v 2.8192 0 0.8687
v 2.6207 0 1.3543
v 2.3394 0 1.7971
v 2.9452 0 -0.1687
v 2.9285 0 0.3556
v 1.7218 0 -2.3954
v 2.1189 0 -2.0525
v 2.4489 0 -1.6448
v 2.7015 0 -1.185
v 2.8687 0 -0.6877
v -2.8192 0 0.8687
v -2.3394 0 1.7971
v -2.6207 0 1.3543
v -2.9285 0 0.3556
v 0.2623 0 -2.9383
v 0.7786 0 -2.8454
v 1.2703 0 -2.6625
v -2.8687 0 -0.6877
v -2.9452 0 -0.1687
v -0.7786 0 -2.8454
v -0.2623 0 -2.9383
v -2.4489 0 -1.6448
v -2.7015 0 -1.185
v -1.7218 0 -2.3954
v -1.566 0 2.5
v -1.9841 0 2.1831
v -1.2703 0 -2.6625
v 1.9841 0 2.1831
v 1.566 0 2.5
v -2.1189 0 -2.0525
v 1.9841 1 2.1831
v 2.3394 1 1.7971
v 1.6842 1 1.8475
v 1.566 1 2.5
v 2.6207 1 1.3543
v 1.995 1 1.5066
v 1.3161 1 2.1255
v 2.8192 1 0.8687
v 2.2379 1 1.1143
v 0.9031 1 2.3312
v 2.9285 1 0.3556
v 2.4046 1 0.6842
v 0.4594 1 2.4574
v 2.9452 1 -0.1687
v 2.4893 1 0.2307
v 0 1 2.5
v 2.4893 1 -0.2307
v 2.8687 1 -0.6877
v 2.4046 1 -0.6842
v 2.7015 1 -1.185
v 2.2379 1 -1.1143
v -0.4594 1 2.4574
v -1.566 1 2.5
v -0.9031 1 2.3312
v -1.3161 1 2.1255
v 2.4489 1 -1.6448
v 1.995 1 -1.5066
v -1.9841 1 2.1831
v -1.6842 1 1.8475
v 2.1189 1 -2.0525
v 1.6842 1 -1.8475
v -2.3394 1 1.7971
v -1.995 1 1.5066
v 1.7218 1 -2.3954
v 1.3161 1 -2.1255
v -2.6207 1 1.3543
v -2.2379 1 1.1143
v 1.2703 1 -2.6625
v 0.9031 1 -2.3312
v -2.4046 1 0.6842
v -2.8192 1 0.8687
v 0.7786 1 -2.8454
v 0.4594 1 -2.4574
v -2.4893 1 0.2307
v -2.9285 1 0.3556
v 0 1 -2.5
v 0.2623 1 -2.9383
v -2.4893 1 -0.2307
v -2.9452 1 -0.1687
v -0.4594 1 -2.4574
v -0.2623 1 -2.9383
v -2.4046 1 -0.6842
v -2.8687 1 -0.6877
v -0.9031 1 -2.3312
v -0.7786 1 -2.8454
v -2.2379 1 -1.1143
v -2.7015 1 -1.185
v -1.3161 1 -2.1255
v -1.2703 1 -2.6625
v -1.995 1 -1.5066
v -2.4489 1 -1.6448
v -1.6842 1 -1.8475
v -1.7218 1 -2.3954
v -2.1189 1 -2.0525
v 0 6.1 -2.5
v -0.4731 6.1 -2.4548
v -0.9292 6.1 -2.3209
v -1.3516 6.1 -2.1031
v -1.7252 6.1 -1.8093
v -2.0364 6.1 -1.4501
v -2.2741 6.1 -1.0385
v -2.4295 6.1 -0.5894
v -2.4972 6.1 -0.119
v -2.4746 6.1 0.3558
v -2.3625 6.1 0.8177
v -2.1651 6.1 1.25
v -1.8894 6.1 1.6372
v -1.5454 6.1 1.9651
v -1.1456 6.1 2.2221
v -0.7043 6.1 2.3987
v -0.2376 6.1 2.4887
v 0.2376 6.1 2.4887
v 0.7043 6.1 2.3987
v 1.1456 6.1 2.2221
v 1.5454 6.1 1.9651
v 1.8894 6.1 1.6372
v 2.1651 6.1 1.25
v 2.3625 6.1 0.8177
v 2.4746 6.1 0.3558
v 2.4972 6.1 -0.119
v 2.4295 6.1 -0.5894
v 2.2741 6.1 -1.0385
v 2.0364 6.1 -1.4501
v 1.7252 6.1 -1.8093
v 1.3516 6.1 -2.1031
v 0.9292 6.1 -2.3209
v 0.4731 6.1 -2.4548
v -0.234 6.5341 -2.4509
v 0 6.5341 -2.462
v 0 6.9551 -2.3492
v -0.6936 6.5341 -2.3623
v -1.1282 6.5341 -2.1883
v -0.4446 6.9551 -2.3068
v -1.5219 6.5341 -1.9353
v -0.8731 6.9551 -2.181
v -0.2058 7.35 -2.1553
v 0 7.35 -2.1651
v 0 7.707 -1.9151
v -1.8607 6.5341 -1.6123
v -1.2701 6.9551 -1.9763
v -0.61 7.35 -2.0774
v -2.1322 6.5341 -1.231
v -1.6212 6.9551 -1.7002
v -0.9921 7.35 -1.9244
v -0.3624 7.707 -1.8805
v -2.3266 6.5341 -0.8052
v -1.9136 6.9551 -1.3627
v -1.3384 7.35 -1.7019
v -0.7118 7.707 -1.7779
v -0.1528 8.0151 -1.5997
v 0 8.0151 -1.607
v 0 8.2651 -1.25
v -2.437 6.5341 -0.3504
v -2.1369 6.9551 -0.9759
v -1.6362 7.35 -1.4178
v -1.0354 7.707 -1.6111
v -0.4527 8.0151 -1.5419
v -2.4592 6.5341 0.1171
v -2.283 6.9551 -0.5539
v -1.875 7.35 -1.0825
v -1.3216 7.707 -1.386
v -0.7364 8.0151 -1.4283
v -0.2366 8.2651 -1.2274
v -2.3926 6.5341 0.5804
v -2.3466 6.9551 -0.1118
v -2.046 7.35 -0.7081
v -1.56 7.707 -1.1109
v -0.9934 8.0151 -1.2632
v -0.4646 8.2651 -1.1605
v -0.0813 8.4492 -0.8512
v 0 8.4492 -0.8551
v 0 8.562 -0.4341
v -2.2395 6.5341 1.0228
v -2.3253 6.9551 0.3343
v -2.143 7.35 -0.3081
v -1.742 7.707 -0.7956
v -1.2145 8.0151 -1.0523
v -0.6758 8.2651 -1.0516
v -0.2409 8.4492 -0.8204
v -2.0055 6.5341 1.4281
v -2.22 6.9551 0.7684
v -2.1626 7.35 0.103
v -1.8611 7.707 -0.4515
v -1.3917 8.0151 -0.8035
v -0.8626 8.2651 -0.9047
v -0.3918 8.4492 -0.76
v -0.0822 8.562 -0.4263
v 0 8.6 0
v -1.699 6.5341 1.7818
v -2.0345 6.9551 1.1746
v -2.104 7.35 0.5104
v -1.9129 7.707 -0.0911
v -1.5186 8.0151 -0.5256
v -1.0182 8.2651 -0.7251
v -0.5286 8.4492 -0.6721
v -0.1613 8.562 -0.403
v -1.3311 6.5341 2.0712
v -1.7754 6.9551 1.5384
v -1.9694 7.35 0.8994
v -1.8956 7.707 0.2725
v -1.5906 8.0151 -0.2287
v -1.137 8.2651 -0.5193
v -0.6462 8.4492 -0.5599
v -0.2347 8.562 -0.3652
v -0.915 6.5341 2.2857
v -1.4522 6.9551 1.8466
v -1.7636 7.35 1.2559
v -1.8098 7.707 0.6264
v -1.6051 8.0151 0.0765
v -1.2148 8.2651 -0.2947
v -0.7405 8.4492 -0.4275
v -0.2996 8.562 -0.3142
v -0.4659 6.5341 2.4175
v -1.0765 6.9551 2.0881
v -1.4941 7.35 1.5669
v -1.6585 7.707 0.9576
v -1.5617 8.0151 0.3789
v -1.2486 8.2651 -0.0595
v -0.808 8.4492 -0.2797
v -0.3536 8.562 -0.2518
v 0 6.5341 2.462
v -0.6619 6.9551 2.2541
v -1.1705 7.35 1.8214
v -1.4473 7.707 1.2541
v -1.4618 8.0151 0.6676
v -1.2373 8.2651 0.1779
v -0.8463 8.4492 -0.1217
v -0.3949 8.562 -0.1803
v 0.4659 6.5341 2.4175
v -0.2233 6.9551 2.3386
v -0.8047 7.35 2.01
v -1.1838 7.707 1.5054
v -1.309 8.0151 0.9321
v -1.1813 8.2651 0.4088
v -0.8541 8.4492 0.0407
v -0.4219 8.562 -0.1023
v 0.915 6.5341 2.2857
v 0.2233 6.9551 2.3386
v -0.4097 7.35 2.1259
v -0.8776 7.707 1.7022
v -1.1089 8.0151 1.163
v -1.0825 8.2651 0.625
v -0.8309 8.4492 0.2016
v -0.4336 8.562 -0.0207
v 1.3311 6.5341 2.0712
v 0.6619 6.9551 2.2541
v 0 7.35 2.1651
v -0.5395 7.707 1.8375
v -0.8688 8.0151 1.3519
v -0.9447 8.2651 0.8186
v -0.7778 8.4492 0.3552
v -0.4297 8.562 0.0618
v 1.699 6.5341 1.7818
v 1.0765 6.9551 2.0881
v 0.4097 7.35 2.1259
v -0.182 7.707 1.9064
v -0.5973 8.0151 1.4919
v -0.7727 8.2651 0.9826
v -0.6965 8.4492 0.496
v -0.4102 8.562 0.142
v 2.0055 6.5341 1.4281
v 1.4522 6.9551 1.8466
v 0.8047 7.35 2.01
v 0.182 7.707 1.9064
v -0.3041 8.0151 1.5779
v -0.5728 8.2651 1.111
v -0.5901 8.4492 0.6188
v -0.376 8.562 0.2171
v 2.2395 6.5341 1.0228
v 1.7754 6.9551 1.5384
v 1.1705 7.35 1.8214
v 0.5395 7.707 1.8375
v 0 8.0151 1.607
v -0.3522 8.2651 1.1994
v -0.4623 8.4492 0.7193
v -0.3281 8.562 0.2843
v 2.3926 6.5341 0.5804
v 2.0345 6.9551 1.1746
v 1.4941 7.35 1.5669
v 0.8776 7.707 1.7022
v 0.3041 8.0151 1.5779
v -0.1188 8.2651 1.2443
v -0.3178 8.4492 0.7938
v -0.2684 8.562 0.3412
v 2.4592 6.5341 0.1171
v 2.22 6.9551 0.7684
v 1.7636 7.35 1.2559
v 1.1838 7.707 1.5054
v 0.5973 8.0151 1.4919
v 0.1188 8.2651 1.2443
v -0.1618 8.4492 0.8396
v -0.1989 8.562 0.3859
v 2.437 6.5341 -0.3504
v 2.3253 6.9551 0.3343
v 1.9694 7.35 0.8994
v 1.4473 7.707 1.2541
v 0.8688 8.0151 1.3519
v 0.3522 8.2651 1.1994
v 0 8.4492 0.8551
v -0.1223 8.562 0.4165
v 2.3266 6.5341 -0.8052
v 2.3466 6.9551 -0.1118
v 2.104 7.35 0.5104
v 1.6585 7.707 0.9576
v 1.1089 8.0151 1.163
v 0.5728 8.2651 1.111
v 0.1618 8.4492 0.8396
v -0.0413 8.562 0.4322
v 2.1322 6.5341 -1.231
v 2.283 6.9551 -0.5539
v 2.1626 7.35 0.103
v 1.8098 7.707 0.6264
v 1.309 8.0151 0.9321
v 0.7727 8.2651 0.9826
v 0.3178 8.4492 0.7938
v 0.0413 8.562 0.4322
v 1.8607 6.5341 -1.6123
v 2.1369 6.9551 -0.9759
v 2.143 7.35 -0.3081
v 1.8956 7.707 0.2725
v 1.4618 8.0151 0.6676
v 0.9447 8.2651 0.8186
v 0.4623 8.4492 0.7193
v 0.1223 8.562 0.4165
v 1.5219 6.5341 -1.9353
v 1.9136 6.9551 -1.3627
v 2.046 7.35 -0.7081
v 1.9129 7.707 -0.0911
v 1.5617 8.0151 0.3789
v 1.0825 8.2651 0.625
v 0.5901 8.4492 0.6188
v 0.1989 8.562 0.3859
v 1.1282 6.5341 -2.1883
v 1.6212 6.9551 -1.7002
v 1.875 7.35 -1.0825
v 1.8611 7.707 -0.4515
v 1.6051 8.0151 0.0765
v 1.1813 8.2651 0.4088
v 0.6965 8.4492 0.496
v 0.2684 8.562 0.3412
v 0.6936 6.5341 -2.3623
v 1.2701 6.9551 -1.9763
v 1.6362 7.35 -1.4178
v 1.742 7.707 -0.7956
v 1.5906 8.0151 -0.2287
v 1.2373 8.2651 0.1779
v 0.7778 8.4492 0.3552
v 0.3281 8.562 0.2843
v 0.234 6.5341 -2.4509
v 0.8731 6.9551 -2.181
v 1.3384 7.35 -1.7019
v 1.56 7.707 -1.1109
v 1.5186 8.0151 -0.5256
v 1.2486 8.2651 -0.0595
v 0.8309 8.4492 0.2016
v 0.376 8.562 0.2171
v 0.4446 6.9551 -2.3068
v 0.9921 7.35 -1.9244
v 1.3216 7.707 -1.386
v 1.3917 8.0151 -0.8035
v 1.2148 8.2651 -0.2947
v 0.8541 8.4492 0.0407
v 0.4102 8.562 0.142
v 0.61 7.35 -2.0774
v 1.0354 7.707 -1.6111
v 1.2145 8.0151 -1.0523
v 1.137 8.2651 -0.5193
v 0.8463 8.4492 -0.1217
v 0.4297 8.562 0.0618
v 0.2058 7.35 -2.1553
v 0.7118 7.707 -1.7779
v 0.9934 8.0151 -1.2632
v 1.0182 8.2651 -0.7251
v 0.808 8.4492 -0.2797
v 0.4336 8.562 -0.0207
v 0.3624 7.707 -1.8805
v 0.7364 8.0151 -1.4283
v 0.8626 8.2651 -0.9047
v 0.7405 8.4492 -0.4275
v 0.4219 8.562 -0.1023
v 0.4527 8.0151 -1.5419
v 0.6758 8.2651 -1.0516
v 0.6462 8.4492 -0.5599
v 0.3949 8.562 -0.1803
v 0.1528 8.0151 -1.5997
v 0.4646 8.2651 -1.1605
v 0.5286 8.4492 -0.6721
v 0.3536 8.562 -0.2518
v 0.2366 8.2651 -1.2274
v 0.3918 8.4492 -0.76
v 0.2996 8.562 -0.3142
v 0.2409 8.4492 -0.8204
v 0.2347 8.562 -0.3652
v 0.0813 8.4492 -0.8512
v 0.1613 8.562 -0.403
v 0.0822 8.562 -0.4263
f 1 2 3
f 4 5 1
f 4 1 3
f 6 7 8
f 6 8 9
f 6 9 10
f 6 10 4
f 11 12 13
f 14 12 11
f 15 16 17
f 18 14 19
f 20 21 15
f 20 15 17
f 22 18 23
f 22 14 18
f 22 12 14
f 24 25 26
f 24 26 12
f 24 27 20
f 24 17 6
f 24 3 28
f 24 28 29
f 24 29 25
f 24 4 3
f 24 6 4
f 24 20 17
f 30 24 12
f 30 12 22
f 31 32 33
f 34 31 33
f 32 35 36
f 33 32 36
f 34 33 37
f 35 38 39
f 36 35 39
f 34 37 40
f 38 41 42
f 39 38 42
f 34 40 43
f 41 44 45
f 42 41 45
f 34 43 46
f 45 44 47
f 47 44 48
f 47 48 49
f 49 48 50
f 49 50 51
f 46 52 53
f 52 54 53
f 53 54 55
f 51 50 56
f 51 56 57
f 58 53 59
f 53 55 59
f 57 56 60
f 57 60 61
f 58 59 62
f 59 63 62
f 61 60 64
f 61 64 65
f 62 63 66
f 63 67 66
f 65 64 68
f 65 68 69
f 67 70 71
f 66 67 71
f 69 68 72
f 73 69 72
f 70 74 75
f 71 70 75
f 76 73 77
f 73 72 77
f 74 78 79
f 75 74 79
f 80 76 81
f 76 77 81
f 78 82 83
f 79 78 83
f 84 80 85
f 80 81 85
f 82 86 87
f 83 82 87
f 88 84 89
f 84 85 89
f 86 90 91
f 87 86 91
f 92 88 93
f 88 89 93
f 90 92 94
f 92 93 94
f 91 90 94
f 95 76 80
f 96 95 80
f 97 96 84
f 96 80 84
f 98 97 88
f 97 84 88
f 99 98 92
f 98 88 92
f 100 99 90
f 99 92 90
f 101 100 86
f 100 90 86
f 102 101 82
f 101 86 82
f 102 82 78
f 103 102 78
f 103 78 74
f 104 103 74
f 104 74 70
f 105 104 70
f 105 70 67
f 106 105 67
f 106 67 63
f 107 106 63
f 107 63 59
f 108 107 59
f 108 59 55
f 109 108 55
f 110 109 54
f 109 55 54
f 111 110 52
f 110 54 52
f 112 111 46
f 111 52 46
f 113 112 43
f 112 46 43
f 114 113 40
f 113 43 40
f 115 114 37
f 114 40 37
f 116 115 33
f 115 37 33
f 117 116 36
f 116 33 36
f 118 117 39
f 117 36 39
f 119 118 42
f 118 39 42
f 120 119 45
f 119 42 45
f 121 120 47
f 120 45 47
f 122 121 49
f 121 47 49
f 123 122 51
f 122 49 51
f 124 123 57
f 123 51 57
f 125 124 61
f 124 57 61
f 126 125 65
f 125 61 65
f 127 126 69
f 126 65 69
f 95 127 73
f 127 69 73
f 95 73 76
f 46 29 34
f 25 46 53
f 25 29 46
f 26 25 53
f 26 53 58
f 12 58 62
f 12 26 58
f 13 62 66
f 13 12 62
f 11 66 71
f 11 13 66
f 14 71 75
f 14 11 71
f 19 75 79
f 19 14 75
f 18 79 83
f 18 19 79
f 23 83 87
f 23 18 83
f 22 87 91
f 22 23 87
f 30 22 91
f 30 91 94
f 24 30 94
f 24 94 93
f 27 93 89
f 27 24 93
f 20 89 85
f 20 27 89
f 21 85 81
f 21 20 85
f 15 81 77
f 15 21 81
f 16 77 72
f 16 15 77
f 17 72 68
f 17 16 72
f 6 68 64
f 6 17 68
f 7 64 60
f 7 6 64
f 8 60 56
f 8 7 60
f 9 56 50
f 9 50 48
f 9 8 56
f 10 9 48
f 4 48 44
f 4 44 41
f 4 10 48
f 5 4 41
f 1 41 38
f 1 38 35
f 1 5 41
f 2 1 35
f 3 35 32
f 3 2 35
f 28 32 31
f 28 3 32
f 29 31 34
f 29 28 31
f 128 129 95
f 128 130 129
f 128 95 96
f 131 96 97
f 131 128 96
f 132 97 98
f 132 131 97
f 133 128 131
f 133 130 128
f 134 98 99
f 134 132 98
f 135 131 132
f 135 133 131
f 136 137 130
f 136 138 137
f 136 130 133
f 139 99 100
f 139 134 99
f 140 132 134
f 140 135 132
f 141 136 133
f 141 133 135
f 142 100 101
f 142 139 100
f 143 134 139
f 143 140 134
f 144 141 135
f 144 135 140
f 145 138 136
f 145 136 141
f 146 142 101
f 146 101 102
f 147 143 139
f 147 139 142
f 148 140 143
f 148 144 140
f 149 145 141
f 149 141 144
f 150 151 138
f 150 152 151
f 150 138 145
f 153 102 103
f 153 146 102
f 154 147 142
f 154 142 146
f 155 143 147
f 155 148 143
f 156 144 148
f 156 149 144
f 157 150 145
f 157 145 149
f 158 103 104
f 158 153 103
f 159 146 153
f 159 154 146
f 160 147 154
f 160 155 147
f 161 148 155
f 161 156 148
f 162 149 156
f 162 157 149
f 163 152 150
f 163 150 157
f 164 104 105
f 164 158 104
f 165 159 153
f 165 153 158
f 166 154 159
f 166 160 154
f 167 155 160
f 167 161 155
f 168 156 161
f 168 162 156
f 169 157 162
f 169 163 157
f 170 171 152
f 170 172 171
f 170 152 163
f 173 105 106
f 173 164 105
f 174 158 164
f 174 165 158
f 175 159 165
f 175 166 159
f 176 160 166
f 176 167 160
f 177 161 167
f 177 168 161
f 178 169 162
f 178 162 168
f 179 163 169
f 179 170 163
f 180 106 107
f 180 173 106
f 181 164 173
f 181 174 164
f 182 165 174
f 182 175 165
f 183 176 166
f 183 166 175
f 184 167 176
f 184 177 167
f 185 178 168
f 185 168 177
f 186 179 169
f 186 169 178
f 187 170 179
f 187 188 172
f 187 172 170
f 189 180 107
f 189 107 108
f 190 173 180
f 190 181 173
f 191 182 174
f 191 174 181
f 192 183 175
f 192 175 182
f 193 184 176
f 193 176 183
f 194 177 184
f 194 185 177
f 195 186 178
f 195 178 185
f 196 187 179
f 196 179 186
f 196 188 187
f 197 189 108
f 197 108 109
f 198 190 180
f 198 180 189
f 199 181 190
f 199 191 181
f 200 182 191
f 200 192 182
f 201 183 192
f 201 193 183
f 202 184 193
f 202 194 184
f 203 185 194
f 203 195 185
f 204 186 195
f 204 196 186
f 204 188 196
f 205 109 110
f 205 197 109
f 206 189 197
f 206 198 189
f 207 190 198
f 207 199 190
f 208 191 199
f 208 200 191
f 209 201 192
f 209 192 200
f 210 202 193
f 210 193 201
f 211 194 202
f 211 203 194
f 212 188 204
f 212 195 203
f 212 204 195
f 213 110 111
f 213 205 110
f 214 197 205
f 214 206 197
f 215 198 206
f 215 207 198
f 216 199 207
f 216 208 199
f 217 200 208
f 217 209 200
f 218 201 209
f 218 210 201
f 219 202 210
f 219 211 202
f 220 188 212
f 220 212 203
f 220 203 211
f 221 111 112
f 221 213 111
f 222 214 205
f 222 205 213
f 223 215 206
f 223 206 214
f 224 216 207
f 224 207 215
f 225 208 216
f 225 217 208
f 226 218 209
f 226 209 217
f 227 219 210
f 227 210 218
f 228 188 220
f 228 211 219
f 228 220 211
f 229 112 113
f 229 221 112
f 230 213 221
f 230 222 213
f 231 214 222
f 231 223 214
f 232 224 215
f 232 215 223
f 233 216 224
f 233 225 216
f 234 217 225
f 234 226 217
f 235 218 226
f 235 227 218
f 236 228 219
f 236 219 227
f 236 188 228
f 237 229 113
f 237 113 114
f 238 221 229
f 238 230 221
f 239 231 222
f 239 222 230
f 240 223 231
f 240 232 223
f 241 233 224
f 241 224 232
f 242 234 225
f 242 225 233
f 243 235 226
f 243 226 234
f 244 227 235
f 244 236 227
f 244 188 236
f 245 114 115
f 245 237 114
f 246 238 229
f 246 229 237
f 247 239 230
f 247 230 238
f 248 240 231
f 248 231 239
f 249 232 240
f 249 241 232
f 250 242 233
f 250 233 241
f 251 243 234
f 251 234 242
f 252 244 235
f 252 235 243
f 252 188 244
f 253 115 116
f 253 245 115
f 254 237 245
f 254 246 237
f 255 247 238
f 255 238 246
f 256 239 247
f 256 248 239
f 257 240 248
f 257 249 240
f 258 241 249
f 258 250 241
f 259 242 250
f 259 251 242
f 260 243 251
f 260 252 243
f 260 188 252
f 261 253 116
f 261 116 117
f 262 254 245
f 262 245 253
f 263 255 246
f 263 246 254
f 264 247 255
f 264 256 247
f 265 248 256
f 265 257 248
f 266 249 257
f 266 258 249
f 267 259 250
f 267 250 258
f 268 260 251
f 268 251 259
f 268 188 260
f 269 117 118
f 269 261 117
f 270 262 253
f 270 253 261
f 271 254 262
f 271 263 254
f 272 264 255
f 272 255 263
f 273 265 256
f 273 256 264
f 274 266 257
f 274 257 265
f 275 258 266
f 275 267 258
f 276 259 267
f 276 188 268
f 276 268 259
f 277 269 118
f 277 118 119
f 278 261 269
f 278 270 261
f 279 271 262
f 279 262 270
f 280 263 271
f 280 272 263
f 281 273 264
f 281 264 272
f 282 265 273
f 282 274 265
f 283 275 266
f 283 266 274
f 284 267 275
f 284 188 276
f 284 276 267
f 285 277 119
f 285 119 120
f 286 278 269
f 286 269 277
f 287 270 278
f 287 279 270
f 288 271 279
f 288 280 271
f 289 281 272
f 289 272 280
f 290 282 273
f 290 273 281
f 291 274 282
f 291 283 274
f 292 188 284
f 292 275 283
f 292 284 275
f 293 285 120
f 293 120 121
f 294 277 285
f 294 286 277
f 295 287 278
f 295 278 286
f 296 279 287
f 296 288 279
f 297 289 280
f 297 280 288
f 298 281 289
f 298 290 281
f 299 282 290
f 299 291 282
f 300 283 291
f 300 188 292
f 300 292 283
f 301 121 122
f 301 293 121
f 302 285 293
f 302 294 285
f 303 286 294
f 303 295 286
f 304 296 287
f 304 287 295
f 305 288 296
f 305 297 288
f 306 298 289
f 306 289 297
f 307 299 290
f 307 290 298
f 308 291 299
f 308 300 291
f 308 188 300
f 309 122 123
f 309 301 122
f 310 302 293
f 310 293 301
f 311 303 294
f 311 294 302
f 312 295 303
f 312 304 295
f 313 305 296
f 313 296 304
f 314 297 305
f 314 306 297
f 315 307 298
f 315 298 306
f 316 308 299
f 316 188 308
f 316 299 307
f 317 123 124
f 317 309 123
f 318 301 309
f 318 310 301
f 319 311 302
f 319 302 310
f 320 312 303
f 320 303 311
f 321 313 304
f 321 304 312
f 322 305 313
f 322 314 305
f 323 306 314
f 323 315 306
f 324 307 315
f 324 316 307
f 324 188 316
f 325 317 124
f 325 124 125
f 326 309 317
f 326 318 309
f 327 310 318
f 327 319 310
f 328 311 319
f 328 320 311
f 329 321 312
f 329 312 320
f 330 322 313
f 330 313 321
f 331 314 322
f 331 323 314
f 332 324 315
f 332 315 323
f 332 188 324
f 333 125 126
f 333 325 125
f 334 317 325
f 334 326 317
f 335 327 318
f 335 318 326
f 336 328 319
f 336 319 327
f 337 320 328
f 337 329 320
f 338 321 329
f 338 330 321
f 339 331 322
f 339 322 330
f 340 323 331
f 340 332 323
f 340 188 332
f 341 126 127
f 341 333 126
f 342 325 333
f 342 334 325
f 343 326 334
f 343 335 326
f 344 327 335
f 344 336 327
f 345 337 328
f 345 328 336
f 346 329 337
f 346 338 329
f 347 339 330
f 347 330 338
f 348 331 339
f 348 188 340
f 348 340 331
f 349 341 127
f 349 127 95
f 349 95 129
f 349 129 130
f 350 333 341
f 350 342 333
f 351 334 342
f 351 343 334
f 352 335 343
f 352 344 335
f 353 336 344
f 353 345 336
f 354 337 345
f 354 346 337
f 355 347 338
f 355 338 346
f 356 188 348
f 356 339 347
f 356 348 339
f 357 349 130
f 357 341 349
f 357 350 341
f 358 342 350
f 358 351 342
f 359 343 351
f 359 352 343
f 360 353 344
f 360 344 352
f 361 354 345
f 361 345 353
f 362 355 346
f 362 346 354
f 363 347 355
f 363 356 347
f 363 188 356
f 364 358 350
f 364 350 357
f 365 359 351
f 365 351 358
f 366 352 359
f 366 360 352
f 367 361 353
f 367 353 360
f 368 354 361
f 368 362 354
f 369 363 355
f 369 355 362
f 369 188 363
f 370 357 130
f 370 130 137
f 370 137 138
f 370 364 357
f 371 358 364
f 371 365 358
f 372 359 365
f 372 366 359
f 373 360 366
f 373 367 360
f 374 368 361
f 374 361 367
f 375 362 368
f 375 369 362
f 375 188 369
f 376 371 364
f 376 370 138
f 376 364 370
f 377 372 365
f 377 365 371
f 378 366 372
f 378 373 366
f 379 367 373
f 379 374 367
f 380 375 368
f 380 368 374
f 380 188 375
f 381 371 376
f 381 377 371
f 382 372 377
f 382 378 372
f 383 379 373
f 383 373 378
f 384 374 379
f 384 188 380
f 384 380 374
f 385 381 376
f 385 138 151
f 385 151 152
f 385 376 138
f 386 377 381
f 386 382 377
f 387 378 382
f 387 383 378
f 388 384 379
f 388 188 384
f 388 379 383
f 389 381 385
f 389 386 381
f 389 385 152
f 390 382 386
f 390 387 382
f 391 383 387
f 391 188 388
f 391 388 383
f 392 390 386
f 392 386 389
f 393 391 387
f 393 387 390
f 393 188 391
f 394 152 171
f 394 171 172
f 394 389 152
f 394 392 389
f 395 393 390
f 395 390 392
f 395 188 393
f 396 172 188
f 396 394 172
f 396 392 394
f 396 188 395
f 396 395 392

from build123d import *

# Parameters (mm, degrees)
SKETCH1_R     = 2.5
BASE_DEPTH    = 8.6
DOME_R        = 2.5
BASECUT_DEPTH = 1


with BuildPart() as part:
    # Sketch1 → Base (new body)
    with BuildSketch(Plane(origin=(0, 0, 0), x_dir=(1, 0, 0), z_dir=(0, 1, 0))):
        with Locations(Location((0, 0, 0), (0, 0, 90))):
            Circle(SKETCH1_R)
    extrude(amount=BASE_DEPTH)

    # Dome
    dome_edges = [part.edges().sort_by_distance(p)[0] for p in [
        (0, 8.6, 2.5),
    ]]
    fillet(dome_edges, radius=DOME_R)

    # BaseCutSketch → BaseCut (add)
    with BuildSketch(Plane(origin=(0, 0, 0), x_dir=(1, 0, 0), z_dir=(0, 1, 0))):
        with BuildLine():
            Line((1.566045976, -2.5), (-1.566045976, -2.5))
            ThreePointArc((-1.566045976, -2.5), (0, 2.95), (1.566045976, -2.5))
        make_face()
    extrude(amount=BASECUT_DEPTH)


solid = part.part
